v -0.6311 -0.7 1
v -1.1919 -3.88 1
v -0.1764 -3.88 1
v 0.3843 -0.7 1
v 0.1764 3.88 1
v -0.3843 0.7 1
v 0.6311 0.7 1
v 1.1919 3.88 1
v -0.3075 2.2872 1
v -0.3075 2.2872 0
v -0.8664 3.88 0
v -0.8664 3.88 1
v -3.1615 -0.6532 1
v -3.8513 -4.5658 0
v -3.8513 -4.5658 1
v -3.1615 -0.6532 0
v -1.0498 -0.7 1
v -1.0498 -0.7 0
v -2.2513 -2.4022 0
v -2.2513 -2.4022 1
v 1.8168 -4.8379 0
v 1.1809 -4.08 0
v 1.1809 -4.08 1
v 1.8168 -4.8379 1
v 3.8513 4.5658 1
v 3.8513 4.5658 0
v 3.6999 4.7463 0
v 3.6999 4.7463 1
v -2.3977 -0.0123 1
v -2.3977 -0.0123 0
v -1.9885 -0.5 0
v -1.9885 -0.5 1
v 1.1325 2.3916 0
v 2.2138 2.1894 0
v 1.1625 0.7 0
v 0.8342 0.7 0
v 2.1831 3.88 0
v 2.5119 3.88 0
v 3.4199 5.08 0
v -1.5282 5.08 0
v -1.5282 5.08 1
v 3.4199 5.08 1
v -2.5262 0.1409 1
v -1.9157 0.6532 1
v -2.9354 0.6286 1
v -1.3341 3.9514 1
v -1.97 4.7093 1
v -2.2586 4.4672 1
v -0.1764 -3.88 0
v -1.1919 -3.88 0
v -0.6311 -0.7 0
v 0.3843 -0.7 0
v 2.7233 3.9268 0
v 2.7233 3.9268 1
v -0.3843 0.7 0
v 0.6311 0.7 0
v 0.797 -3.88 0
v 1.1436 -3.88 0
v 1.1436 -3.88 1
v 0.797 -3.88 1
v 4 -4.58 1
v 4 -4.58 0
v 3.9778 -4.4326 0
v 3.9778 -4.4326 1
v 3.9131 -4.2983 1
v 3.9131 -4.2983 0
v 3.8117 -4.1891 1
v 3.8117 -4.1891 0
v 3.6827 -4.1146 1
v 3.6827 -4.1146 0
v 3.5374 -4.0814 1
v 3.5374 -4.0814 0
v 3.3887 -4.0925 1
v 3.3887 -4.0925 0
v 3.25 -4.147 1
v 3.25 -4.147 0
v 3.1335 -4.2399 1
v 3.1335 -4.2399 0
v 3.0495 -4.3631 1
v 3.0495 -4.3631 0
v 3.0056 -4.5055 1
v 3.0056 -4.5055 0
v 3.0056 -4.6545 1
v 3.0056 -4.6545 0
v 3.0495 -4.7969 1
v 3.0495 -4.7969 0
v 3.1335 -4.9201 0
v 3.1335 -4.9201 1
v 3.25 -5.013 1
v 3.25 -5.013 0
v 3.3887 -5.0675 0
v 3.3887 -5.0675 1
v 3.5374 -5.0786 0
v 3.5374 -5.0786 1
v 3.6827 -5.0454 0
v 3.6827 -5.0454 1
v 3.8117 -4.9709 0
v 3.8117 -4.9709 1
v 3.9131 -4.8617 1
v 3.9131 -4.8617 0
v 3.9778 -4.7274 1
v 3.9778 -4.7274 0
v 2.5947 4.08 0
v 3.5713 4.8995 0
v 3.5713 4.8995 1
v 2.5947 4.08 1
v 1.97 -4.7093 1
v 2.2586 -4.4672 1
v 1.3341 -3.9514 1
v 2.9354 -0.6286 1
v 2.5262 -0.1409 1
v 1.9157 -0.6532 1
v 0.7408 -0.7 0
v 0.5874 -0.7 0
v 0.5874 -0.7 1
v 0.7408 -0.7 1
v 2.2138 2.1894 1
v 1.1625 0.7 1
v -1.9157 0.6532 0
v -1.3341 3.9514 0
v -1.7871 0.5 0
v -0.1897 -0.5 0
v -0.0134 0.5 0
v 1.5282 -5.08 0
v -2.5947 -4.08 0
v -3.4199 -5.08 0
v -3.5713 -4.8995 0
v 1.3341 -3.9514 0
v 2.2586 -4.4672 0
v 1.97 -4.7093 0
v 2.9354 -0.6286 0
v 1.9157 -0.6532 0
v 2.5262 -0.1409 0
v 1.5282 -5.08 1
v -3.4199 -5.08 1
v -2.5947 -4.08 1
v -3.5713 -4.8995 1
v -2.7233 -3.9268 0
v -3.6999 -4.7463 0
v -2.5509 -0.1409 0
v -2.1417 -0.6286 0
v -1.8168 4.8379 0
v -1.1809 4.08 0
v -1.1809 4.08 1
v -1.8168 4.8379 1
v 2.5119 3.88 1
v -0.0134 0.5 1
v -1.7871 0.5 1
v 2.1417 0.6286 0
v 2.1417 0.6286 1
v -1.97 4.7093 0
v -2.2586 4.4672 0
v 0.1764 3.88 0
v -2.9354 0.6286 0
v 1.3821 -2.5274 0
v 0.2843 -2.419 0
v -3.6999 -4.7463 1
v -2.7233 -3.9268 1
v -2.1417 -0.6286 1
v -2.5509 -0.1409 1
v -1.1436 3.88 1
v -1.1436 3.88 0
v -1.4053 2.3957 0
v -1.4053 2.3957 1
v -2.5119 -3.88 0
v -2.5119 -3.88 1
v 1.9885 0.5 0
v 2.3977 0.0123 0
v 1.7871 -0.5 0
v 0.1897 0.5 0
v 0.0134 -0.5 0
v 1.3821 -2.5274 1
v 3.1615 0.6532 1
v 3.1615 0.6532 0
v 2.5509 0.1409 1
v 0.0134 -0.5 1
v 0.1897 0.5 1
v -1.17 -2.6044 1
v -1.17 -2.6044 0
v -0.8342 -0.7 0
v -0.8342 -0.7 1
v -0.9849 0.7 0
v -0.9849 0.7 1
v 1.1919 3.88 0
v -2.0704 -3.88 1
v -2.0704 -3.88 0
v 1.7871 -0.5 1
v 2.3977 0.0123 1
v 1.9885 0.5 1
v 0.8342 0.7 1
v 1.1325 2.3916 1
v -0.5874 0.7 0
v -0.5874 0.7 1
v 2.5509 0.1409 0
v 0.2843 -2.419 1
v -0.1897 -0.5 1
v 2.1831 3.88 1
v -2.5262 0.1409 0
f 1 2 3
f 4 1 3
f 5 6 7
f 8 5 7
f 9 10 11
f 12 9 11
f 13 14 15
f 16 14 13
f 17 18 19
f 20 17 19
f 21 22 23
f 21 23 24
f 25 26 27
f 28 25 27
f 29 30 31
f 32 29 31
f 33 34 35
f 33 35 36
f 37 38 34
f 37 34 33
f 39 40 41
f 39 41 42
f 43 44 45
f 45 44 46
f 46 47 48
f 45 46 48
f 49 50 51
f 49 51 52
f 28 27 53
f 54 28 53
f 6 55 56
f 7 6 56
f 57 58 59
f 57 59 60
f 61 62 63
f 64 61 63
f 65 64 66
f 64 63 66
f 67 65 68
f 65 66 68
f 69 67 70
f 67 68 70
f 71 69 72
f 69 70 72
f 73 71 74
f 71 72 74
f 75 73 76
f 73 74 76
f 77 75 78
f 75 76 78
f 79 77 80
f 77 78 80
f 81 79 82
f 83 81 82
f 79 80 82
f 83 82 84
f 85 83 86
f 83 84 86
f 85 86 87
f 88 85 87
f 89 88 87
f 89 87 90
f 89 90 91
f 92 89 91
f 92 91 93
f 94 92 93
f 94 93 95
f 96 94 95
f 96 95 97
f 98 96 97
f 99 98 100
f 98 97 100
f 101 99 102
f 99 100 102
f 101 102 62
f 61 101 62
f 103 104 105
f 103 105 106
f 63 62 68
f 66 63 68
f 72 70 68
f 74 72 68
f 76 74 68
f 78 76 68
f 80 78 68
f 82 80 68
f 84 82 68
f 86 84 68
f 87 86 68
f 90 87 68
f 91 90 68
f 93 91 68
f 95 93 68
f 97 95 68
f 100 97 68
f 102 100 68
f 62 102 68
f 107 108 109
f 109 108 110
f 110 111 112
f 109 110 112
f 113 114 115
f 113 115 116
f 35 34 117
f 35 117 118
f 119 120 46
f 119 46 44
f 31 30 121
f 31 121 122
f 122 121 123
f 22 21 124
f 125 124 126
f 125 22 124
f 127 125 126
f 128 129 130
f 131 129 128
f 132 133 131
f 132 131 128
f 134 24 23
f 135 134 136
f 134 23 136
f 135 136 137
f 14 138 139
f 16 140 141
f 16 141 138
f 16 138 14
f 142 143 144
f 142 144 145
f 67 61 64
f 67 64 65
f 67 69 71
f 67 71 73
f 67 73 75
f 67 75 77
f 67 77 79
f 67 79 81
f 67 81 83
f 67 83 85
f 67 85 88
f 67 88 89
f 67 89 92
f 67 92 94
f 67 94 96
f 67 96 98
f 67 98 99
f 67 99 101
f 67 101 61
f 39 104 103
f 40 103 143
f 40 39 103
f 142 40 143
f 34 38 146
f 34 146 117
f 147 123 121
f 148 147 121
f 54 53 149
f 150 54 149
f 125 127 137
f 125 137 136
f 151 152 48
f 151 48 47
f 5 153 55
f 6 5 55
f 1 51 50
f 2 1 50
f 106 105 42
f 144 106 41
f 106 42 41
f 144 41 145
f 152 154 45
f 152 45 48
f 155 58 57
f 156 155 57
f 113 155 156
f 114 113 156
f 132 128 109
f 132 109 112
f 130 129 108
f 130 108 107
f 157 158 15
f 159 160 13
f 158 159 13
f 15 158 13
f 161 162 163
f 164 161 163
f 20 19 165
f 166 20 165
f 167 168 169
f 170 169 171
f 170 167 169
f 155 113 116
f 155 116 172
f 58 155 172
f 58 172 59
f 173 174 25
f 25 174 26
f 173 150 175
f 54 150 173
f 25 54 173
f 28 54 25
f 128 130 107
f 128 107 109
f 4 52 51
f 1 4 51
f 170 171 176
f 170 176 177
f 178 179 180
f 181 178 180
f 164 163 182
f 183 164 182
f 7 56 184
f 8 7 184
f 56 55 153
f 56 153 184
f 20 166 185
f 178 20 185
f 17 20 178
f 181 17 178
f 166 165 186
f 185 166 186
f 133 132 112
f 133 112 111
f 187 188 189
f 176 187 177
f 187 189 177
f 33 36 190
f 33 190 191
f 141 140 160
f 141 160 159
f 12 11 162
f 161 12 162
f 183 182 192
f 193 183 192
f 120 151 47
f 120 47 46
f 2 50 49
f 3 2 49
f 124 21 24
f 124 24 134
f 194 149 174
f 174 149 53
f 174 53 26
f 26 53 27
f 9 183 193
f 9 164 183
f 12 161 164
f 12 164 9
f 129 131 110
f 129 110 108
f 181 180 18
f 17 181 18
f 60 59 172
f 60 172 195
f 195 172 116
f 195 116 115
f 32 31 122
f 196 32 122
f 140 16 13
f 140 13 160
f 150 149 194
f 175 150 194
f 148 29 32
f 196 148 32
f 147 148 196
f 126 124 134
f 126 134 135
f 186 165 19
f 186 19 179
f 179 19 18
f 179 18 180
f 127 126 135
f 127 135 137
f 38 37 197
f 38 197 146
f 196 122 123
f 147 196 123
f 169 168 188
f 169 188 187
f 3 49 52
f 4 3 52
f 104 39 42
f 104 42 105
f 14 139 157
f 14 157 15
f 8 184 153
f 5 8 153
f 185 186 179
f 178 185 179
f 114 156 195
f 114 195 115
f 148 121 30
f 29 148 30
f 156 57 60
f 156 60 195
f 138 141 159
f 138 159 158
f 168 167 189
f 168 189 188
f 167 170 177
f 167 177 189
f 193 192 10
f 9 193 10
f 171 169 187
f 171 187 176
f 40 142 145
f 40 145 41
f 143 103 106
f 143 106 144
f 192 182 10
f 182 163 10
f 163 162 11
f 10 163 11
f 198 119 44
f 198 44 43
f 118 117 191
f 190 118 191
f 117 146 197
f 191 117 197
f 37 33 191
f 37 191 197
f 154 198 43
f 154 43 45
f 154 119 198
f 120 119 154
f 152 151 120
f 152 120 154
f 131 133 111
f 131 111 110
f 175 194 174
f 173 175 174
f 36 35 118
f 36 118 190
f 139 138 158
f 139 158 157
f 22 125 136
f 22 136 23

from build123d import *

# Parameters (mm, degrees)
EXTRUDE_1_DEPTH   = 1
EXTRUDE_1_2_DEPTH = 1
EXTRUDE_1_3_DEPTH = 1
EXTRUDE_1_4_DEPTH = 1
EXTRUDE_1_5_DEPTH = 1
EXTRUDE_1_6_DEPTH = 1
EXTRUDE_1_7_DEPTH = 1
EXTRUDE_1_8_DEPTH = 1
EXTRUDE_2_DEPTH   = 1
EXTRUDE_2_2_DEPTH = 1
SKETCH_8_R        = 0.5
EXTRUDE_3_DEPTH   = 1
EXTRUDE_4_DEPTH   = 1
EXTRUDE_4_2_DEPTH = 1
EXTRUDE_4_3_DEPTH = 1
EXTRUDE_4_4_DEPTH = 1


with BuildPart() as part:
    # Эскиз5 → Бобышка-Вытянуть1 (new body)
    with BuildSketch(Plane.XY):
        Polygon((-2.935448186, 0.628557522), (-2.258598217, 4.467164446), (-1.970028174, 4.709303462), (-1.334107302, 3.951442478), (-1.915674873, 0.653208889), (-2.526240846, 0.140883205), align=None)
    extrude(amount=EXTRUDE_1_DEPTH)


with BuildPart() as body_2:
    # Эскиз5 → Extrude 1 2 (new body)
    with BuildSketch(Plane.XY):
        Polygon((-3.161458187, -0.653208889), (-2.550892213, -0.140883205), (-2.141684874, -0.628557522), (-2.723252444, -3.926791111), (-3.699881881, -4.746280512), (-3.851348259, -4.565769912), align=None)
    extrude(amount=EXTRUDE_1_2_DEPTH)


with BuildPart() as body_3:
    # Эскиз5 → Extrude 1 3 (new body)
    with BuildSketch(Plane.XY):
        Polygon((-3.571324359, -4.8994894), (-2.594694922, -4.08), (1.180898414, -4.08), (1.816819285, -4.837860984), (1.528249243, -5.08), (-3.419857982, -5.08), align=None)
    extrude(amount=EXTRUDE_1_3_DEPTH)


with BuildPart() as body_4:
    # Эскиз5 → Extrude 1 4 (new body)
    with BuildSketch(Plane.XY):
        Polygon((1.915674873, -0.653208889), (2.526240846, -0.140883205), (2.935448186, -0.628557522), (2.258598217, -4.467164446), (1.970028174, -4.709303462), (1.334107302, -3.951442478), align=None)
    extrude(amount=EXTRUDE_1_4_DEPTH)


with BuildPart() as body_5:
    # Эскиз5 → Extrude 1 5 (new body)
    with BuildSketch(Plane.XY):
        Polygon((2.141684874, 0.628557522), (2.550892213, 0.140883205), (3.161458187, 0.653208889), (3.851348259, 4.565769912), (3.699881881, 4.746280512), (2.723252444, 3.926791111), align=None)
    extrude(amount=EXTRUDE_1_5_DEPTH)


with BuildPart() as body_6:
    # Эскиз5 → Extrude 1 6 (new body)
    with BuildSketch(Plane.XY):
        Polygon((-1.816819285, 4.837860984), (-1.528249243, 5.08), (3.419857982, 5.08), (3.571324359, 4.8994894), (2.594694922, 4.08), (-1.180898414, 4.08), align=None)
    extrude(amount=EXTRUDE_1_6_DEPTH)


with BuildPart() as body_7:
    # Эскиз5 → Extrude 1 7 (new body)
    with BuildSketch(Plane.XY):
        Polygon((-1.988475985, -0.5), (-0.189706152, -0.5), (-0.013379171, 0.5), (-1.787117351, 0.5), (-2.397683324, -0.012325683), align=None)
    extrude(amount=EXTRUDE_1_7_DEPTH)


with BuildPart() as body_8:
    # Эскиз5 → Extrude 1 8 (new body)
    with BuildSketch(Plane.XY):
        Polygon((0.189706152, 0.5), (1.988475985, 0.5), (2.397683324, 0.012325683), (1.787117351, -0.5), (0.013379171, -0.5), align=None)
    extrude(amount=EXTRUDE_1_8_DEPTH)


with BuildPart() as body_9:
    # Эскиз6 → Бобышка-Вытянуть2 (new body)
    with BuildSketch(Plane.XY):
        Polygon((-0.384284419, 0.7), (0.631142192, 0.7), (1.191861991, 3.88), (0.176435379, 3.88), align=None)
    extrude(amount=EXTRUDE_2_DEPTH)


with BuildPart() as body_10:
    # Эскиз6 → Extrude 2 2 (new body)
    with BuildSketch(Plane.XY):
        Polygon((-0.631142192, -0.7), (-1.191861991, -3.88), (-0.176435379, -3.88), (0.384284419, -0.7), align=None)
    extrude(amount=EXTRUDE_2_2_DEPTH)


with BuildPart() as body_11:
    # Эскиз8 → Бобышка-Вытянуть3 (new body)
    with BuildSketch(Plane.XY):
        with Locations((3.5, -4.58)):
            Circle(SKETCH_8_R)
    extrude(amount=EXTRUDE_3_DEPTH)


with BuildPart() as body_12:
    # Эскиз7 → Бобышка-Вытянуть4 (new body)
    with BuildSketch(Plane.XY):
        Polygon((-2.251347225, -2.40223772), (-2.511916587, -3.88), (-2.070426511, -3.88), (-1.170027732, -2.604417668), (-0.834227515, -0.7), (-1.049784045, -0.7), align=None)
    extrude(amount=EXTRUDE_4_DEPTH)


with BuildPart() as body_13:
    # Эскиз7 → Extrude 4 2 (new body)
    with BuildSketch(Plane.XY):
        Polygon((0.587369742, -0.7), (0.740825314, -0.7), (1.382118658, -2.52740245), (1.143619216, -3.88), (0.796998801, -3.88), (0.284271691, -2.418954467), align=None)
    extrude(amount=EXTRUDE_4_2_DEPTH)


with BuildPart() as body_14:
    # Эскиз7 → Extrude 4 3 (new body)
    with BuildSketch(Plane.XY):
        Polygon((2.183113044, 3.88), (2.511916587, 3.88), (2.213825111, 2.189439235), (1.162470577, 0.7), (0.834227515, 0.7), (1.132505618, 2.391619183), align=None)
    extrude(amount=EXTRUDE_4_3_DEPTH)


with BuildPart() as body_15:
    # Эскиз7 → Extrude 4 4 (new body)
    with BuildSketch(Plane.XY):
        Polygon((-0.984913448, 0.7), (-0.587369742, 0.7), (-0.307494907, 2.28724906), (-0.866441612, 3.88), (-1.143619216, 3.88), (-1.405341875, 2.395697044), align=None)
    extrude(amount=EXTRUDE_4_4_DEPTH)


solid = Compound([part.part, body_2.part, body_3.part, body_4.part, body_5.part, body_6.part, body_7.part, body_8.part, body_9.part, body_10.part, body_11.part, body_12.part, body_13.part, body_14.part, body_15.part])
